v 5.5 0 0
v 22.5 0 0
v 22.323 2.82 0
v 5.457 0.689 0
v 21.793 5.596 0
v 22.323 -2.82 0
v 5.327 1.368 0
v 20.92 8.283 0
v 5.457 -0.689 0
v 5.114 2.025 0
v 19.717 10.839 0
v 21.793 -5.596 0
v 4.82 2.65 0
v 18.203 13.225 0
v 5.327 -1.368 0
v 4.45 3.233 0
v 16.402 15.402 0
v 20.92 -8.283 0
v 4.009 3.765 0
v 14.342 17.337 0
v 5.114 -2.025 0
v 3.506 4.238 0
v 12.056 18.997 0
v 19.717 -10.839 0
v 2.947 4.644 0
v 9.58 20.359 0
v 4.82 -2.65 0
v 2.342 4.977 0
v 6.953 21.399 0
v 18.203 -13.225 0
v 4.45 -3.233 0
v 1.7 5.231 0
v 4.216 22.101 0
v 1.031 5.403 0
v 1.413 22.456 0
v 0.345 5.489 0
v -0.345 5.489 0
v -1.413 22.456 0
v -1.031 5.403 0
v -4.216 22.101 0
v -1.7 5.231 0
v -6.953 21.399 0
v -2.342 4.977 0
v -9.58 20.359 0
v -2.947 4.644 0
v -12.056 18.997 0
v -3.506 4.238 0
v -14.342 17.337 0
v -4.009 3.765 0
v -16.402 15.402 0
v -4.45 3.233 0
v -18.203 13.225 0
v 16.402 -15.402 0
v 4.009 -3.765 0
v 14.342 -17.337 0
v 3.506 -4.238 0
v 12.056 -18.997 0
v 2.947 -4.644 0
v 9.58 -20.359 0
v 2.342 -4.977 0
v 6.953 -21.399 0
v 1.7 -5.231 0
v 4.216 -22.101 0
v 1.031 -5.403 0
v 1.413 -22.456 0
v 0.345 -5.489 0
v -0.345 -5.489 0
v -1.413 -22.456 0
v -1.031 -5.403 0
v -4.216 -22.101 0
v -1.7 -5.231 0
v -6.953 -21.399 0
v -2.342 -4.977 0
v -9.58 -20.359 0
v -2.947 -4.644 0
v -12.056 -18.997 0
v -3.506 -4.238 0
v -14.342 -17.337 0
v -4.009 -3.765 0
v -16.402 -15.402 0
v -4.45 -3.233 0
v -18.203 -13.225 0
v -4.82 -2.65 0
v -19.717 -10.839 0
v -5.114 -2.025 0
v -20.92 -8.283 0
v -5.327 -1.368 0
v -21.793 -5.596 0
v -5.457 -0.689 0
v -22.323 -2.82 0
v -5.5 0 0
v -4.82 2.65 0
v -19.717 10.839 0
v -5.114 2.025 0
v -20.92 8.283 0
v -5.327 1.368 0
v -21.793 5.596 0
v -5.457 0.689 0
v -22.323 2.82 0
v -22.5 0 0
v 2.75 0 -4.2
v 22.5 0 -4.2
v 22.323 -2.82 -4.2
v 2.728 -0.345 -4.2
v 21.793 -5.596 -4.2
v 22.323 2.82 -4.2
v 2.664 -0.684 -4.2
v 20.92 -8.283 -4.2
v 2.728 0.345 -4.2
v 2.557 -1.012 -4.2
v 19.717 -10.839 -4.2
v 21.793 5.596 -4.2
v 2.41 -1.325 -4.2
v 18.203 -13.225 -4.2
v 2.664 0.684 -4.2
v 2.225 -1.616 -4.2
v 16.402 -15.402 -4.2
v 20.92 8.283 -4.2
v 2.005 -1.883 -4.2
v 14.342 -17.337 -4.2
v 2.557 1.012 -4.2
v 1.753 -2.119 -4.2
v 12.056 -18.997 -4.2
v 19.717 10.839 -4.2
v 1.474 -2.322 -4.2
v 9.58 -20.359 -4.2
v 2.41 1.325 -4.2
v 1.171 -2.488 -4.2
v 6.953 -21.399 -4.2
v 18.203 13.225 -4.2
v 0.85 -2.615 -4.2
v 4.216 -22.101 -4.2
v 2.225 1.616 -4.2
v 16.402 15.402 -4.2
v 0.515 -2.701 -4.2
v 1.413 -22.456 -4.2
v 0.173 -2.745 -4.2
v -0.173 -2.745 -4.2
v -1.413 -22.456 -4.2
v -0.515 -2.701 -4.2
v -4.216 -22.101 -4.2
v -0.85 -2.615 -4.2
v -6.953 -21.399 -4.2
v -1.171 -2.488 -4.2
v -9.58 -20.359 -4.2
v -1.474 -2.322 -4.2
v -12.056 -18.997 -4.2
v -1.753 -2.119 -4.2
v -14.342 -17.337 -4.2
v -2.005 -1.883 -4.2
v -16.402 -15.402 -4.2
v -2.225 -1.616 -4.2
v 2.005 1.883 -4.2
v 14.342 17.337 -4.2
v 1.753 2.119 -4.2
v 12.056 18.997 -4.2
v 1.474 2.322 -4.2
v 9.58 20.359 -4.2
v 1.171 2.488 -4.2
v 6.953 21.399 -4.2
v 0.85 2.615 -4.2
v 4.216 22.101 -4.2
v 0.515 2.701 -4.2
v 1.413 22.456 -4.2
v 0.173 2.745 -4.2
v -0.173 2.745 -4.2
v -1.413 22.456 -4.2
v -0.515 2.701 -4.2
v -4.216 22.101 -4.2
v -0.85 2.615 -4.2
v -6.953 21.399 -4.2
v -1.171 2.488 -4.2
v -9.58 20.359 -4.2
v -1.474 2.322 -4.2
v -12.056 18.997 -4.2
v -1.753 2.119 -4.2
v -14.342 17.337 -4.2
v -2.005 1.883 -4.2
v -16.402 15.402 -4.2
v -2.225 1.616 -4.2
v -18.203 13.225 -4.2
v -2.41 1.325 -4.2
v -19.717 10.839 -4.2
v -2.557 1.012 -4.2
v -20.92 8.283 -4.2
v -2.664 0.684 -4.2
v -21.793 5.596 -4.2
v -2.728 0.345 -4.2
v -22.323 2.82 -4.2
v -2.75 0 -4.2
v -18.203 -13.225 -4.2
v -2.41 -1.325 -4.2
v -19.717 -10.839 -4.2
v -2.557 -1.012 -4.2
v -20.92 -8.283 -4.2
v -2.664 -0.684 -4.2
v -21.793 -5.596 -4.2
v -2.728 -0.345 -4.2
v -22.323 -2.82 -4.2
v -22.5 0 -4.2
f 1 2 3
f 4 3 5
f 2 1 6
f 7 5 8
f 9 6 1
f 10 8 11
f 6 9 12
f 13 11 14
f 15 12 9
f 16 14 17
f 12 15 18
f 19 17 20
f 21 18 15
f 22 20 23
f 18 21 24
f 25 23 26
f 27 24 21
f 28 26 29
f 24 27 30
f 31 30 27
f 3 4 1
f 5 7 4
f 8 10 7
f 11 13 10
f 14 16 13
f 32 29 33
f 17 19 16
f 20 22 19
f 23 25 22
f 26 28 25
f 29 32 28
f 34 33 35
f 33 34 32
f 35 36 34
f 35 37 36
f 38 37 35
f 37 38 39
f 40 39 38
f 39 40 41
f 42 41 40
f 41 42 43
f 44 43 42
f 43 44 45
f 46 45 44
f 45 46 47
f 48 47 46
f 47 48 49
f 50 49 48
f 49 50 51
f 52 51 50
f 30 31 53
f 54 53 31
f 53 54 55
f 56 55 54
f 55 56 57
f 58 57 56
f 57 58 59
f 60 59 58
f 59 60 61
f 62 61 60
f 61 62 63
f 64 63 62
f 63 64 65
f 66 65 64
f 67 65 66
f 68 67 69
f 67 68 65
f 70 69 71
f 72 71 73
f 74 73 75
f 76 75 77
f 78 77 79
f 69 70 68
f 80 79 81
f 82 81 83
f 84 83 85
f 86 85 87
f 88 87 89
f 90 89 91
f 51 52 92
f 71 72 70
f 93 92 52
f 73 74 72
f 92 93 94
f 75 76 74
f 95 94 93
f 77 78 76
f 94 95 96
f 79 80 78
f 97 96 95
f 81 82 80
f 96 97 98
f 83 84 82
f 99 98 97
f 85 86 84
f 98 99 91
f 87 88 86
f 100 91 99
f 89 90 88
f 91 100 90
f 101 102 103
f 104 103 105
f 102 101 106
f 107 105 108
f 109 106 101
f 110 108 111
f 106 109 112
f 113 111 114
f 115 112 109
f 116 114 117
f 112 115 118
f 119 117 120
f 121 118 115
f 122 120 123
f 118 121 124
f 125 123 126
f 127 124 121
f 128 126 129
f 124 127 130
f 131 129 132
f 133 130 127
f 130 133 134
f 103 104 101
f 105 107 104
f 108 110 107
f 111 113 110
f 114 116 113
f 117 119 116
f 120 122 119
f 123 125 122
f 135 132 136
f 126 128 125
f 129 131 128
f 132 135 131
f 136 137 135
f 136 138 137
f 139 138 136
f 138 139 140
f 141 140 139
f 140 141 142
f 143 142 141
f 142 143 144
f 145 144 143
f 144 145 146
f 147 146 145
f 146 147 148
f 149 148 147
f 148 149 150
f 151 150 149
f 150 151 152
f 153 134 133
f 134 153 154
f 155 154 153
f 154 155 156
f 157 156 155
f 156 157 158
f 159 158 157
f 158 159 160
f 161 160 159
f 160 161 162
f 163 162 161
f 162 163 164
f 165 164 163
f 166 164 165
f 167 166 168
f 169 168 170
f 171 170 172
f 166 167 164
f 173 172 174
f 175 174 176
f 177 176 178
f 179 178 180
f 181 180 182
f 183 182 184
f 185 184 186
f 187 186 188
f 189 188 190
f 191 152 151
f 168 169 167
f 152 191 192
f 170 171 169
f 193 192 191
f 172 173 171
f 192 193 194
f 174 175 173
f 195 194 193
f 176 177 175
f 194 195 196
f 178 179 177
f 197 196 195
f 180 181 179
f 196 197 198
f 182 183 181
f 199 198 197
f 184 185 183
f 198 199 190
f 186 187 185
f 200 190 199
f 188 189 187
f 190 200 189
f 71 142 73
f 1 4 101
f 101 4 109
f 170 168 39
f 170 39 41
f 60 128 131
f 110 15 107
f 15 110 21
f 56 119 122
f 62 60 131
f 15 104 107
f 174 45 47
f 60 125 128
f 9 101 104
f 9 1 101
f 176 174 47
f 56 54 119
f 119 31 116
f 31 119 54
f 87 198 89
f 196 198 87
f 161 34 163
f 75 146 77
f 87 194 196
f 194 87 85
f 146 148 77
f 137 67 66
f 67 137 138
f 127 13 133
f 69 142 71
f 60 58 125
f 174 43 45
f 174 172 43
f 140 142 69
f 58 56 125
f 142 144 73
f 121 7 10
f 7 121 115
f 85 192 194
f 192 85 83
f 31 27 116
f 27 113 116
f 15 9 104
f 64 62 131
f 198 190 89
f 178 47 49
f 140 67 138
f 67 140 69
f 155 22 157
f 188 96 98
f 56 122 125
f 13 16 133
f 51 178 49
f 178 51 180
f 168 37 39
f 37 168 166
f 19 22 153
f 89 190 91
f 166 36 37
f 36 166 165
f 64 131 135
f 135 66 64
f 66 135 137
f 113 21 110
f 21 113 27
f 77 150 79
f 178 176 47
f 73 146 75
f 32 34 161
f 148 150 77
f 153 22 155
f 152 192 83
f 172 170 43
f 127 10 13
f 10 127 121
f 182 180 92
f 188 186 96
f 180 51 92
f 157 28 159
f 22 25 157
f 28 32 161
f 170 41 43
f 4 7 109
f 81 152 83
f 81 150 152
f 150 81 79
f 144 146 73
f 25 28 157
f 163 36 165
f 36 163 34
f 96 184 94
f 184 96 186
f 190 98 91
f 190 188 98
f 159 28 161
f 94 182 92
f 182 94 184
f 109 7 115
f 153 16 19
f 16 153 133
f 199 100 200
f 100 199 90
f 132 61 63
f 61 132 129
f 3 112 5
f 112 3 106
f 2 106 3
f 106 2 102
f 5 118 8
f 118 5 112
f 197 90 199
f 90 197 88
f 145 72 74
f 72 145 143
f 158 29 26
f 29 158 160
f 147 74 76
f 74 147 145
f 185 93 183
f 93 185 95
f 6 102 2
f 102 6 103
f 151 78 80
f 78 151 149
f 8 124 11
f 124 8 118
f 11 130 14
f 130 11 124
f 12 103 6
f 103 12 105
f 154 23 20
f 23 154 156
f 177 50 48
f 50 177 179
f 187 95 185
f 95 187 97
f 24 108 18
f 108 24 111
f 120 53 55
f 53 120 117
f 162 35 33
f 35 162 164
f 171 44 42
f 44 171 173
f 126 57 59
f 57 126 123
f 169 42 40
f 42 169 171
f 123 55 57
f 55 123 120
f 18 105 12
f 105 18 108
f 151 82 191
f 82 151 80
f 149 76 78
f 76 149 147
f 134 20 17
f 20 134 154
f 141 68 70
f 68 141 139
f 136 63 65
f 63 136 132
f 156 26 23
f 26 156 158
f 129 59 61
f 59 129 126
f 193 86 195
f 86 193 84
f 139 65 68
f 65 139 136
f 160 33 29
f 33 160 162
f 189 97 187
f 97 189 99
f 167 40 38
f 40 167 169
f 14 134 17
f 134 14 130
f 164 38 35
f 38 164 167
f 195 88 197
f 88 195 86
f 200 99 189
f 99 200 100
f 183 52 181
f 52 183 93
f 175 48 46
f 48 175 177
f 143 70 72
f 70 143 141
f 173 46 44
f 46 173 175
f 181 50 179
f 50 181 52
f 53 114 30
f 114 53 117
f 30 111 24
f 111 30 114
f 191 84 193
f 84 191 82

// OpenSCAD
$fn = 50;


difference() {
	union() {
		translate(v = [0, 0, -4.2000000000]) {
			cylinder(h = 4.2000000000, r = 22.5000000000);
		}
	}
	union() {
		translate(v = [0, 0, 0]) {
			rotate(a = [0, 0, 0]) {
				difference() {
					union() {
						translate(v = [0, 0, -4.2000000000]) {
							cylinder(h = 4.2000000000, r = 2.2500000000);
						}
						translate(v = [0, 0, -4.2000000000]) {
							cylinder(h = 4.2000000000, r1 = 2.7500000000, r2 = 5.5000000000);
						}
						translate(v = [0, 0, -4.2000000000]) {
							cylinder(h = 4.2000000000, r = 2.7500000000);
						}
						translate(v = [0, 0, -4.2000000000]) {
							cylinder(h = 4.2000000000, r = 2.2500000000);
						}
					}
					union();
				}
			}
		}
	}
}
